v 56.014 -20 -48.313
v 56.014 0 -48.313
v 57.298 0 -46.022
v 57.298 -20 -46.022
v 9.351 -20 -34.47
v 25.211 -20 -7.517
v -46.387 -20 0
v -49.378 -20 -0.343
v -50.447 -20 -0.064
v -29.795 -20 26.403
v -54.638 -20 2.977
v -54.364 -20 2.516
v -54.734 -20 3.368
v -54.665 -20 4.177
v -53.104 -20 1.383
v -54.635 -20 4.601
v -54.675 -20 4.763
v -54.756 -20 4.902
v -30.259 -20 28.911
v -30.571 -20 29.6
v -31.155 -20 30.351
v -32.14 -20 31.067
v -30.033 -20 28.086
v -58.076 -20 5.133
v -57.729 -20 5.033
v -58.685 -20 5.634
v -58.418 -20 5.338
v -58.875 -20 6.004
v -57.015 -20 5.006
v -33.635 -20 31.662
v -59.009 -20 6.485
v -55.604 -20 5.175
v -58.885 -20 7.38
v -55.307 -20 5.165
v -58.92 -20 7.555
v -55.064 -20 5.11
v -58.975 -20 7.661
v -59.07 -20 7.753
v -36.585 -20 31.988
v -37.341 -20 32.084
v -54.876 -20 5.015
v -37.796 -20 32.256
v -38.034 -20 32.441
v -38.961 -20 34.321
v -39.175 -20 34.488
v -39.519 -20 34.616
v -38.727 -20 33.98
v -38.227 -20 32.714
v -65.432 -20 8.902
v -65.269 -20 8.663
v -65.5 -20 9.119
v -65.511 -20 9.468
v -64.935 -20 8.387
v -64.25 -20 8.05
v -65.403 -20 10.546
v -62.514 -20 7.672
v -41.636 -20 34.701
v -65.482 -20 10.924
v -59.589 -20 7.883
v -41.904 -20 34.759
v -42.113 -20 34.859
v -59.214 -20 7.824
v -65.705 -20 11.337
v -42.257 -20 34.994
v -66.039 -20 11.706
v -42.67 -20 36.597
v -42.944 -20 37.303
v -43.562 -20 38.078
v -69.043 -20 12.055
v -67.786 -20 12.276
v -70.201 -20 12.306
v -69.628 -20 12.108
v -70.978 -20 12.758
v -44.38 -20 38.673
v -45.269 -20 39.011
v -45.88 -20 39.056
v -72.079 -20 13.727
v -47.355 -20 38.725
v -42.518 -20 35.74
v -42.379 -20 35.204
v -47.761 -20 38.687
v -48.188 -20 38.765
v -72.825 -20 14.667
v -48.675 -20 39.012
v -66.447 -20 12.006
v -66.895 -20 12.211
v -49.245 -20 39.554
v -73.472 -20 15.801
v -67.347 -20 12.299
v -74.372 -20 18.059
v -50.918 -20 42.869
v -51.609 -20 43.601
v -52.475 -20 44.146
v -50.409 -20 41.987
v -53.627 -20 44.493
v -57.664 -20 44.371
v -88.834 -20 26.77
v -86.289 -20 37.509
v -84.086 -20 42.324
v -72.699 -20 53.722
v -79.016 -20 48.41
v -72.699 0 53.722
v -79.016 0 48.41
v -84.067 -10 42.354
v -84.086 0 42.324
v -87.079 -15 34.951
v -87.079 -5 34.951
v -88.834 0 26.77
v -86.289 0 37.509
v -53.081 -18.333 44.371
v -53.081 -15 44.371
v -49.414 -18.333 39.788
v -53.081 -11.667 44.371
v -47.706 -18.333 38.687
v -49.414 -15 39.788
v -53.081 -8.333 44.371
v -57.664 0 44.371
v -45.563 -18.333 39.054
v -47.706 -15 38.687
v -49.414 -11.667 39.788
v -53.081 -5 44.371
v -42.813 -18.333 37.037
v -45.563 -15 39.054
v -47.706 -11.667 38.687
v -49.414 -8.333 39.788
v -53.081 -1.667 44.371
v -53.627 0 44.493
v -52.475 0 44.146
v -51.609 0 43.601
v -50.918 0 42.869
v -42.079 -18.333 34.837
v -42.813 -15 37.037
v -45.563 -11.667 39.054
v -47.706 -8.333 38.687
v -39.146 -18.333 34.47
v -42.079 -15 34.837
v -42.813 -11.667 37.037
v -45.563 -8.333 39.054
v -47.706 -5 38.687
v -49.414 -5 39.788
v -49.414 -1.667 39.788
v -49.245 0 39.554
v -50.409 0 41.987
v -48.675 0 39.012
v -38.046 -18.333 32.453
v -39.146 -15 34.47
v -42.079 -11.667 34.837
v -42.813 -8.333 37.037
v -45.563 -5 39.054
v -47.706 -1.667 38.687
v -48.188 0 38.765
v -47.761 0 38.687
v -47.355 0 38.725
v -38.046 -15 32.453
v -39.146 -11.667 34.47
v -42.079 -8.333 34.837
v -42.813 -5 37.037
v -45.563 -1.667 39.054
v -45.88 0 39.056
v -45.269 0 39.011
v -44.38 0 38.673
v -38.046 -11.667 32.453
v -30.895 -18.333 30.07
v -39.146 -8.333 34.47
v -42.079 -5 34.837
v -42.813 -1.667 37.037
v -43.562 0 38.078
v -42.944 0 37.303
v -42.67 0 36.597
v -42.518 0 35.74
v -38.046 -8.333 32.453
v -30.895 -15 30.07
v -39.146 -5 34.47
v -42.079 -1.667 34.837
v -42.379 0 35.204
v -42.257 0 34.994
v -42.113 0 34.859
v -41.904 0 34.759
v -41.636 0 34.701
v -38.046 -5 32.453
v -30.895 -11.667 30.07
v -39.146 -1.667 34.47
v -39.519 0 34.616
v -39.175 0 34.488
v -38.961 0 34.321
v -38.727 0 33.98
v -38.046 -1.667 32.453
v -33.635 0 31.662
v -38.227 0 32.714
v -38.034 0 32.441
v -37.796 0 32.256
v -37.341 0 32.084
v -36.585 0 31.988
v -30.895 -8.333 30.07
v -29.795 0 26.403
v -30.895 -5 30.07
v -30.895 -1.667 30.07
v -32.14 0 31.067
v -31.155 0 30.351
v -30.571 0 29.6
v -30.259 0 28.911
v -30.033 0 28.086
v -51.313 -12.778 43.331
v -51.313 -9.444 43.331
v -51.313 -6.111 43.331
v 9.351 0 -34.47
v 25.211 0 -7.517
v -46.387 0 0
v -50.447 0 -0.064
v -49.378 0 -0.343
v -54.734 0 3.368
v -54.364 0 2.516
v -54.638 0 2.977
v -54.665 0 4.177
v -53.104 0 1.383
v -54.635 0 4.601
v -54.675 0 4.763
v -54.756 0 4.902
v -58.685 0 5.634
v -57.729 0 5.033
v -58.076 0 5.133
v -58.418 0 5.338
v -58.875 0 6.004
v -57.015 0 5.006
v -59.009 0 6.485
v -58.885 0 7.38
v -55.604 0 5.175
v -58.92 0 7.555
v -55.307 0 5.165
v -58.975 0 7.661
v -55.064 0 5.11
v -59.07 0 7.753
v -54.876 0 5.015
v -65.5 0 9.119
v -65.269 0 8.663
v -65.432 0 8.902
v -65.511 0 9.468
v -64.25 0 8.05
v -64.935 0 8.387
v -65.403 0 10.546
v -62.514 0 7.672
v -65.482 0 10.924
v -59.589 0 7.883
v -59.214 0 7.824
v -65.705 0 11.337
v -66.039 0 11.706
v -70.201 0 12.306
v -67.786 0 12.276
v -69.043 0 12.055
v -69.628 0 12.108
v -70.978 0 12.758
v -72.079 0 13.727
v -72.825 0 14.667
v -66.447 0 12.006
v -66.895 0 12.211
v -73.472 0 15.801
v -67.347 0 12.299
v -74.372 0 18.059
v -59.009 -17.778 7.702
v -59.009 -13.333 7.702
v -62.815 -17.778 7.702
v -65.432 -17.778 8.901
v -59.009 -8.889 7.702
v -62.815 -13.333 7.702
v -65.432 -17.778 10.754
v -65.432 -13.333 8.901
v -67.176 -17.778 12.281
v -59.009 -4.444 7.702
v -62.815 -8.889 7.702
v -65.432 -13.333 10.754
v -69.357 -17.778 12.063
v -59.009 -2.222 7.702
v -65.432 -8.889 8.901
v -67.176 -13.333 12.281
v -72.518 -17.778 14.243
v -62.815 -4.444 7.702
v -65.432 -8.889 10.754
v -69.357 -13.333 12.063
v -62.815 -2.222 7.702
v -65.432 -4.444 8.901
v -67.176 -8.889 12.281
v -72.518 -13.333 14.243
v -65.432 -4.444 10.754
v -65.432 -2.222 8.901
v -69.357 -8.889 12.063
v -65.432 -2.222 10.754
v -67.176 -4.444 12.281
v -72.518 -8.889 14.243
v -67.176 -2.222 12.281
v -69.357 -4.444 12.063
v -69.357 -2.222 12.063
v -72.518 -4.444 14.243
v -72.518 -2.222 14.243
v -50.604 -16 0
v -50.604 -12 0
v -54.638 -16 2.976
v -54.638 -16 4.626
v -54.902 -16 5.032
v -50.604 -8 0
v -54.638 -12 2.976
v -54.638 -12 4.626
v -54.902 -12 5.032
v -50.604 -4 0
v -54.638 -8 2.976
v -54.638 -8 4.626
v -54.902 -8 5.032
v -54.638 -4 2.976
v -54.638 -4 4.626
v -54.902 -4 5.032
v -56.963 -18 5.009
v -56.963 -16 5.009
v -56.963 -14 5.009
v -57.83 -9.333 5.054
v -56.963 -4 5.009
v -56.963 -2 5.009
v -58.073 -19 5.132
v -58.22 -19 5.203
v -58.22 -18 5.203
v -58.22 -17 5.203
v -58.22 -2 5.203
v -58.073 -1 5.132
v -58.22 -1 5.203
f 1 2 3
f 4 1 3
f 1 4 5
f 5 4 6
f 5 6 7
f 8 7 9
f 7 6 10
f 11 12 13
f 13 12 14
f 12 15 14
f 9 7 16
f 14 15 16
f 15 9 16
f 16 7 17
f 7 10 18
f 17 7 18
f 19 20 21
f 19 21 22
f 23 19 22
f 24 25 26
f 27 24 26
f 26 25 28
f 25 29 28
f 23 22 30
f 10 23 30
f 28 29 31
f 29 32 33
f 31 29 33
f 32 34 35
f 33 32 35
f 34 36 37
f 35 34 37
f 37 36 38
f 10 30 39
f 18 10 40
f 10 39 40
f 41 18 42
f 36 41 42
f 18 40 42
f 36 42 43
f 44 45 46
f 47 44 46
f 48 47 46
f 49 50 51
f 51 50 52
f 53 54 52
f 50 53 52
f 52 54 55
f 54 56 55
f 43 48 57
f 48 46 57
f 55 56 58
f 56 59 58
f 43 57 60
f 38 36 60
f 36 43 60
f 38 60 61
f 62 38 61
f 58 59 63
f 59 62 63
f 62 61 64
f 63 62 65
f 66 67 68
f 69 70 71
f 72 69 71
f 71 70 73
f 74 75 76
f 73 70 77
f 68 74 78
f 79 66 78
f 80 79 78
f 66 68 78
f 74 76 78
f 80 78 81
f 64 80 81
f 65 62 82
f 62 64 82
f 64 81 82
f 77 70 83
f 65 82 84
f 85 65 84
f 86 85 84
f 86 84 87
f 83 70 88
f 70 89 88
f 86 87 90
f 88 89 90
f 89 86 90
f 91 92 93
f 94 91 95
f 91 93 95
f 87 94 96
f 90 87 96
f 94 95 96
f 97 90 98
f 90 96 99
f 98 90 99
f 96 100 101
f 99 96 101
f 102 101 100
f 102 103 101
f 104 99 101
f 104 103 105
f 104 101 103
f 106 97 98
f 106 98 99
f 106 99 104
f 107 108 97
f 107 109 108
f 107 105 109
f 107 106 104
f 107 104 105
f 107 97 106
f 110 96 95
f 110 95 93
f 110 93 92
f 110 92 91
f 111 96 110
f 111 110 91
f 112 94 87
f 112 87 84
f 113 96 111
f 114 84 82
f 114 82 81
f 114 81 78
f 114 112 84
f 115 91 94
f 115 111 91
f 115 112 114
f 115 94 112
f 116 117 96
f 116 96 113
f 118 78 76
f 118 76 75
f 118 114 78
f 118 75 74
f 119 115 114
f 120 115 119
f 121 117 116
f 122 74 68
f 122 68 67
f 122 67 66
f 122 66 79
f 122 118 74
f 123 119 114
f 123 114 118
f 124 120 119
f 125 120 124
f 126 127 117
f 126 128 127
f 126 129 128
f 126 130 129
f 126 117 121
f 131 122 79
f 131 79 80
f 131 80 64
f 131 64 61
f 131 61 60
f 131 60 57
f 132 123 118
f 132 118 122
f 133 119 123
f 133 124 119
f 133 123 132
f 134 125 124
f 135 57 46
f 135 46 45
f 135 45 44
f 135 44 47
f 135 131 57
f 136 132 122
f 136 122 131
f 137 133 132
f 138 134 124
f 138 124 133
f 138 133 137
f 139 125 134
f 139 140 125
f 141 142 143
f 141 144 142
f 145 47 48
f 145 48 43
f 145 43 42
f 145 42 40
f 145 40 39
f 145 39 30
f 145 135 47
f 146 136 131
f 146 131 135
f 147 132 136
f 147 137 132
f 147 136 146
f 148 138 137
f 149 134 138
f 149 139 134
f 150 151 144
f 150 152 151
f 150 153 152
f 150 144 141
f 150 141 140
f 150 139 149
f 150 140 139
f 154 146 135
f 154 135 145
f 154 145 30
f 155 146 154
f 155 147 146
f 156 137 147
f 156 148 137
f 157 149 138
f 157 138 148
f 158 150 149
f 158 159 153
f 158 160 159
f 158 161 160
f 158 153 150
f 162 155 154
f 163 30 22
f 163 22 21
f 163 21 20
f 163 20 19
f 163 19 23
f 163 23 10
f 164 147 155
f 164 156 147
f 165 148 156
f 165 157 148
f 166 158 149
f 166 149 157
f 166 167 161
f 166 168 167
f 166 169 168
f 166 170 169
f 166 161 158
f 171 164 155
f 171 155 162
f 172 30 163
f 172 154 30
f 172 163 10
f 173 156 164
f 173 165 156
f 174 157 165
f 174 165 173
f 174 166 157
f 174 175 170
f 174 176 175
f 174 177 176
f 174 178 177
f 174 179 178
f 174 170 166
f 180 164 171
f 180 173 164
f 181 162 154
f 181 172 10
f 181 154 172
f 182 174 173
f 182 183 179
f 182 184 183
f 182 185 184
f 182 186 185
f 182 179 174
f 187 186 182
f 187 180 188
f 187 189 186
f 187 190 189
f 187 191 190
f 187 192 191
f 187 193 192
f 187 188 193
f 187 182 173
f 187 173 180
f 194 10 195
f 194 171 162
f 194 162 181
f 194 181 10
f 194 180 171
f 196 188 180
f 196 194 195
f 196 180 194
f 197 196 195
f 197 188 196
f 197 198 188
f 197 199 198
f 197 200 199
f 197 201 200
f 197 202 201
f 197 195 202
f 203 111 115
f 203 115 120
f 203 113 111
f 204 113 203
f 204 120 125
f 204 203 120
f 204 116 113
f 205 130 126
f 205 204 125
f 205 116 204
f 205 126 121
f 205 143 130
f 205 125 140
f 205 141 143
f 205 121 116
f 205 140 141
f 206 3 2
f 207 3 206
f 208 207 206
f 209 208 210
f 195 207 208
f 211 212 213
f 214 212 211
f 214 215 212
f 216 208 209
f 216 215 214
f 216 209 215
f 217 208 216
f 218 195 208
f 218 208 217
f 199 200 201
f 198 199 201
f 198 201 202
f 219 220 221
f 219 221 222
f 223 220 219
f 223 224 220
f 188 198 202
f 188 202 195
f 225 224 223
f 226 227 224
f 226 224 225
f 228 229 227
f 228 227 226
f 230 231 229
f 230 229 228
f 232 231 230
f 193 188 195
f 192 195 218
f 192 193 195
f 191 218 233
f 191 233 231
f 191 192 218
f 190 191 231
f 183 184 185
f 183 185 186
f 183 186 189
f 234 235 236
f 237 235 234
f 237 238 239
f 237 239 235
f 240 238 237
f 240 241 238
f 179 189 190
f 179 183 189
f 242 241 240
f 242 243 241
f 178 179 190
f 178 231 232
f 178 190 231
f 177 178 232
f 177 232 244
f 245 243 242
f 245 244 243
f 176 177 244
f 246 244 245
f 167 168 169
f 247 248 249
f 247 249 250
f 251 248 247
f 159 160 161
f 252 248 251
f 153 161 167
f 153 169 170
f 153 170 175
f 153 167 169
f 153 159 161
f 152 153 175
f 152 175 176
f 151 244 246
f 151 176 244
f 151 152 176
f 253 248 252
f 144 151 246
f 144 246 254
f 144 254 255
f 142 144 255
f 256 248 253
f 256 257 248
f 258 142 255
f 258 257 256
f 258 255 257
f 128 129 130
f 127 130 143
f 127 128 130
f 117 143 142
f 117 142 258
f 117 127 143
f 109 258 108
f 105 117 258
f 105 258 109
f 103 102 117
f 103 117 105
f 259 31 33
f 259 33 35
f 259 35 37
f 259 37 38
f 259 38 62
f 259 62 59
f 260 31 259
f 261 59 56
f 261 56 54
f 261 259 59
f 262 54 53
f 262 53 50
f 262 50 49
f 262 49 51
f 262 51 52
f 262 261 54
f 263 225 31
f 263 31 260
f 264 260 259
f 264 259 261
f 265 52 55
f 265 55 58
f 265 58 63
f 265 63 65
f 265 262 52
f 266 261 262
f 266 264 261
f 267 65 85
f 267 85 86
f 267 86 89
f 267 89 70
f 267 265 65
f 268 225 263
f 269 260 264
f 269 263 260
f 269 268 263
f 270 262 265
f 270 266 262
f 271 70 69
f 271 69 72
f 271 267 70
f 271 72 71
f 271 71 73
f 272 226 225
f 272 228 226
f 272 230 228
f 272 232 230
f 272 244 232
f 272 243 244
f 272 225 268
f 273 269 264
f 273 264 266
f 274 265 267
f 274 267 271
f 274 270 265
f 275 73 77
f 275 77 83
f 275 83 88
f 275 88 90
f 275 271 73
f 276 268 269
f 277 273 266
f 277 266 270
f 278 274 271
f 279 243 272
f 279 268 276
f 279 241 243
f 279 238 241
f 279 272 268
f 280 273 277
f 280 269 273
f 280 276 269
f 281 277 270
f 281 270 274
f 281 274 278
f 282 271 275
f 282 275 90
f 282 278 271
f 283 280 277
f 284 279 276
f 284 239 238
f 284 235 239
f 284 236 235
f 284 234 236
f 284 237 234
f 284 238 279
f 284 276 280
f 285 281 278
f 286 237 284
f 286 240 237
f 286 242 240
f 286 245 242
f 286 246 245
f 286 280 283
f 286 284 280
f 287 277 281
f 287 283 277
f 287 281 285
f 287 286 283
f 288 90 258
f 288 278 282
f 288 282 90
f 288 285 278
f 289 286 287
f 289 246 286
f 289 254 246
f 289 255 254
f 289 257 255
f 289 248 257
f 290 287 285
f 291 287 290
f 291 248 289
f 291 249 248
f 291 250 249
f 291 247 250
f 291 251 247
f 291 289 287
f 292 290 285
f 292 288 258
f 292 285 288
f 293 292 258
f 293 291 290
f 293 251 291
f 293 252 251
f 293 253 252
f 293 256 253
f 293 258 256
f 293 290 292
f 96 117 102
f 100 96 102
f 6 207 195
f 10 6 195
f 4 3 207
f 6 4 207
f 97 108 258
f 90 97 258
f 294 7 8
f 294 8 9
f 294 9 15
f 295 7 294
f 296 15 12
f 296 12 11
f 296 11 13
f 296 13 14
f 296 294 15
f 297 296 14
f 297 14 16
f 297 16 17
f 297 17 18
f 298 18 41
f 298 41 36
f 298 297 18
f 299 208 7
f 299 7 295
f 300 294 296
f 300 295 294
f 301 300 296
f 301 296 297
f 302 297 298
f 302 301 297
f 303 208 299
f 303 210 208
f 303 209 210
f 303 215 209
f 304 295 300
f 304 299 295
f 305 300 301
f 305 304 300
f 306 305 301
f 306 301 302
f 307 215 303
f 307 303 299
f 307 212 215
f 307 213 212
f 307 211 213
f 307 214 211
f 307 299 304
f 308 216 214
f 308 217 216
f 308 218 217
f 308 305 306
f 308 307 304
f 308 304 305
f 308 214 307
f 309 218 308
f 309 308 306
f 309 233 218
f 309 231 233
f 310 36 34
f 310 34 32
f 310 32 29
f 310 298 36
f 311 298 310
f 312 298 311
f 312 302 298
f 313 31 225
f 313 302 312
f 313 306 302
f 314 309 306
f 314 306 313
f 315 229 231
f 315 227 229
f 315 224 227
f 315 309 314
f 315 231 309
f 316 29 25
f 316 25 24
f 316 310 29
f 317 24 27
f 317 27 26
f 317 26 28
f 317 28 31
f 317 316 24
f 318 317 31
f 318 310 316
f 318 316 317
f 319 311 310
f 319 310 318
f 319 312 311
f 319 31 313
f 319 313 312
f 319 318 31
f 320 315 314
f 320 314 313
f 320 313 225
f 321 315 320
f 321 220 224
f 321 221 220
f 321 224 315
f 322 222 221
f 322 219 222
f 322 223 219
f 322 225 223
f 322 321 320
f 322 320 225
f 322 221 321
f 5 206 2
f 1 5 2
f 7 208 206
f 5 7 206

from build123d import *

# Parameters (mm, degrees)
F1_DEPTH = 20


with BuildPart() as f1:
    # F0 (on Front) → F1 (new body)
    with BuildSketch(Plane.XZ):
        with BuildLine():
            add(Edge.make_bspline(
                [(-88.8344049454, 26.7695002258), (-87.8038011595, 32.3106045016), (-85.7496109929, 43.3550835453), (-77.0395307075, 50.2744749157), (-72.699368, 53.7223517895)],
                knots=[0, 0, 0, 0, 0.501708071, 1, 1, 1, 1], degree=3))
            Line((-88.8344049454, 26.7695002258), (-74.3715763092, 18.0588103831))
            add(Edge.make_bspline(
                [(-59.0090863407, 6.4851129428), (-58.8981575273, 6.9777438339), (-58.6632126373, 8.0211256837), (-60.7362823751, 7.8088858481), (-62.6528478175, 7.4544078457), (-66.168909679, 8.5800629997), (-64.8499873825, 10.8677578561), (-67.2289602564, 12.8234184157), (-69.4466887305, 11.4363273139), (-72.9761860972, 14.1490657202), (-73.8988039616, 16.7341492619), (-74.3715763092, 18.0588103831)],
                knots=[0, 0, 0, 0, 0.0791802138, 0.1677020248, 0.2763840484, 0.3981736679, 0.495903374, 0.6051949105, 0.7114618123, 0.8521458541, 1, 1, 1, 1], degree=3))
            add(Edge.make_bspline(
                [(-46.3872365654, 0), (-48.8761662315, -0.4328818518), (-49.9054258781, -0.6145223717), (-55.4626347421, 2.5934481343), (-54.3162160041, 4.6820915901), (-55.5429938643, 5.6083160556), (-58.5946487154, 4.308206622), (-59.0090863407, 6.4851129428)],
                knots=[0, 0, 0, 0, 0.2406608634, 0.5030451623, 0.6535889913, 0.7747637411, 1, 1, 1, 1], degree=3))
            Line((-46.3872365654, 0), (9.3509899452, -34.4703122973))
            Line((9.3509899452, -34.4703122973), (56.0142621398, -48.3134463429))
            Line((56.0142621398, -48.3134463429), (57.297732681, -46.0215397179))
            Line((57.297732681, -46.0215397179), (25.2110026777, -7.5174621306))
            Line((25.2110026777, -7.5174621306), (-29.7948215157, 26.4027938247))
            add(Edge.make_bspline(
                [(-57.6644390821, 44.3713627756), (-56.0180864372, 44.55607482), (-53.0382408398, 44.890397709), (-50.4056866524, 42.7435590443), (-49.7404009285, 39.697890739), (-47.7515725732, 38.2378926281), (-45.5464320871, 39.6821155176), (-42.2151906117, 37.3702893034), (-42.8498194431, 34.0506255958), (-38.4818419171, 35.3251444244), (-38.5479835621, 31.6785049513), (-34.7563441046, 32.2693254944), (-30.2502887191, 30.5410675775), (-29.9429023959, 27.7482237817), (-29.7948215157, 26.4027938247)],
                knots=[0, 0, 0, 0, 0.1021238279, 0.18484086, 0.2679396368, 0.3351140401, 0.4063537653, 0.4944436515, 0.5670854763, 0.6491018032, 0.7214007501, 0.8062623042, 0.9066684287, 1, 1, 1, 1], degree=3))
            Line((-57.6644390821, 44.3713627756), (-72.699368, 53.7223517895))
        make_face()
    extrude(amount=F1_DEPTH)


solid = f1.part
